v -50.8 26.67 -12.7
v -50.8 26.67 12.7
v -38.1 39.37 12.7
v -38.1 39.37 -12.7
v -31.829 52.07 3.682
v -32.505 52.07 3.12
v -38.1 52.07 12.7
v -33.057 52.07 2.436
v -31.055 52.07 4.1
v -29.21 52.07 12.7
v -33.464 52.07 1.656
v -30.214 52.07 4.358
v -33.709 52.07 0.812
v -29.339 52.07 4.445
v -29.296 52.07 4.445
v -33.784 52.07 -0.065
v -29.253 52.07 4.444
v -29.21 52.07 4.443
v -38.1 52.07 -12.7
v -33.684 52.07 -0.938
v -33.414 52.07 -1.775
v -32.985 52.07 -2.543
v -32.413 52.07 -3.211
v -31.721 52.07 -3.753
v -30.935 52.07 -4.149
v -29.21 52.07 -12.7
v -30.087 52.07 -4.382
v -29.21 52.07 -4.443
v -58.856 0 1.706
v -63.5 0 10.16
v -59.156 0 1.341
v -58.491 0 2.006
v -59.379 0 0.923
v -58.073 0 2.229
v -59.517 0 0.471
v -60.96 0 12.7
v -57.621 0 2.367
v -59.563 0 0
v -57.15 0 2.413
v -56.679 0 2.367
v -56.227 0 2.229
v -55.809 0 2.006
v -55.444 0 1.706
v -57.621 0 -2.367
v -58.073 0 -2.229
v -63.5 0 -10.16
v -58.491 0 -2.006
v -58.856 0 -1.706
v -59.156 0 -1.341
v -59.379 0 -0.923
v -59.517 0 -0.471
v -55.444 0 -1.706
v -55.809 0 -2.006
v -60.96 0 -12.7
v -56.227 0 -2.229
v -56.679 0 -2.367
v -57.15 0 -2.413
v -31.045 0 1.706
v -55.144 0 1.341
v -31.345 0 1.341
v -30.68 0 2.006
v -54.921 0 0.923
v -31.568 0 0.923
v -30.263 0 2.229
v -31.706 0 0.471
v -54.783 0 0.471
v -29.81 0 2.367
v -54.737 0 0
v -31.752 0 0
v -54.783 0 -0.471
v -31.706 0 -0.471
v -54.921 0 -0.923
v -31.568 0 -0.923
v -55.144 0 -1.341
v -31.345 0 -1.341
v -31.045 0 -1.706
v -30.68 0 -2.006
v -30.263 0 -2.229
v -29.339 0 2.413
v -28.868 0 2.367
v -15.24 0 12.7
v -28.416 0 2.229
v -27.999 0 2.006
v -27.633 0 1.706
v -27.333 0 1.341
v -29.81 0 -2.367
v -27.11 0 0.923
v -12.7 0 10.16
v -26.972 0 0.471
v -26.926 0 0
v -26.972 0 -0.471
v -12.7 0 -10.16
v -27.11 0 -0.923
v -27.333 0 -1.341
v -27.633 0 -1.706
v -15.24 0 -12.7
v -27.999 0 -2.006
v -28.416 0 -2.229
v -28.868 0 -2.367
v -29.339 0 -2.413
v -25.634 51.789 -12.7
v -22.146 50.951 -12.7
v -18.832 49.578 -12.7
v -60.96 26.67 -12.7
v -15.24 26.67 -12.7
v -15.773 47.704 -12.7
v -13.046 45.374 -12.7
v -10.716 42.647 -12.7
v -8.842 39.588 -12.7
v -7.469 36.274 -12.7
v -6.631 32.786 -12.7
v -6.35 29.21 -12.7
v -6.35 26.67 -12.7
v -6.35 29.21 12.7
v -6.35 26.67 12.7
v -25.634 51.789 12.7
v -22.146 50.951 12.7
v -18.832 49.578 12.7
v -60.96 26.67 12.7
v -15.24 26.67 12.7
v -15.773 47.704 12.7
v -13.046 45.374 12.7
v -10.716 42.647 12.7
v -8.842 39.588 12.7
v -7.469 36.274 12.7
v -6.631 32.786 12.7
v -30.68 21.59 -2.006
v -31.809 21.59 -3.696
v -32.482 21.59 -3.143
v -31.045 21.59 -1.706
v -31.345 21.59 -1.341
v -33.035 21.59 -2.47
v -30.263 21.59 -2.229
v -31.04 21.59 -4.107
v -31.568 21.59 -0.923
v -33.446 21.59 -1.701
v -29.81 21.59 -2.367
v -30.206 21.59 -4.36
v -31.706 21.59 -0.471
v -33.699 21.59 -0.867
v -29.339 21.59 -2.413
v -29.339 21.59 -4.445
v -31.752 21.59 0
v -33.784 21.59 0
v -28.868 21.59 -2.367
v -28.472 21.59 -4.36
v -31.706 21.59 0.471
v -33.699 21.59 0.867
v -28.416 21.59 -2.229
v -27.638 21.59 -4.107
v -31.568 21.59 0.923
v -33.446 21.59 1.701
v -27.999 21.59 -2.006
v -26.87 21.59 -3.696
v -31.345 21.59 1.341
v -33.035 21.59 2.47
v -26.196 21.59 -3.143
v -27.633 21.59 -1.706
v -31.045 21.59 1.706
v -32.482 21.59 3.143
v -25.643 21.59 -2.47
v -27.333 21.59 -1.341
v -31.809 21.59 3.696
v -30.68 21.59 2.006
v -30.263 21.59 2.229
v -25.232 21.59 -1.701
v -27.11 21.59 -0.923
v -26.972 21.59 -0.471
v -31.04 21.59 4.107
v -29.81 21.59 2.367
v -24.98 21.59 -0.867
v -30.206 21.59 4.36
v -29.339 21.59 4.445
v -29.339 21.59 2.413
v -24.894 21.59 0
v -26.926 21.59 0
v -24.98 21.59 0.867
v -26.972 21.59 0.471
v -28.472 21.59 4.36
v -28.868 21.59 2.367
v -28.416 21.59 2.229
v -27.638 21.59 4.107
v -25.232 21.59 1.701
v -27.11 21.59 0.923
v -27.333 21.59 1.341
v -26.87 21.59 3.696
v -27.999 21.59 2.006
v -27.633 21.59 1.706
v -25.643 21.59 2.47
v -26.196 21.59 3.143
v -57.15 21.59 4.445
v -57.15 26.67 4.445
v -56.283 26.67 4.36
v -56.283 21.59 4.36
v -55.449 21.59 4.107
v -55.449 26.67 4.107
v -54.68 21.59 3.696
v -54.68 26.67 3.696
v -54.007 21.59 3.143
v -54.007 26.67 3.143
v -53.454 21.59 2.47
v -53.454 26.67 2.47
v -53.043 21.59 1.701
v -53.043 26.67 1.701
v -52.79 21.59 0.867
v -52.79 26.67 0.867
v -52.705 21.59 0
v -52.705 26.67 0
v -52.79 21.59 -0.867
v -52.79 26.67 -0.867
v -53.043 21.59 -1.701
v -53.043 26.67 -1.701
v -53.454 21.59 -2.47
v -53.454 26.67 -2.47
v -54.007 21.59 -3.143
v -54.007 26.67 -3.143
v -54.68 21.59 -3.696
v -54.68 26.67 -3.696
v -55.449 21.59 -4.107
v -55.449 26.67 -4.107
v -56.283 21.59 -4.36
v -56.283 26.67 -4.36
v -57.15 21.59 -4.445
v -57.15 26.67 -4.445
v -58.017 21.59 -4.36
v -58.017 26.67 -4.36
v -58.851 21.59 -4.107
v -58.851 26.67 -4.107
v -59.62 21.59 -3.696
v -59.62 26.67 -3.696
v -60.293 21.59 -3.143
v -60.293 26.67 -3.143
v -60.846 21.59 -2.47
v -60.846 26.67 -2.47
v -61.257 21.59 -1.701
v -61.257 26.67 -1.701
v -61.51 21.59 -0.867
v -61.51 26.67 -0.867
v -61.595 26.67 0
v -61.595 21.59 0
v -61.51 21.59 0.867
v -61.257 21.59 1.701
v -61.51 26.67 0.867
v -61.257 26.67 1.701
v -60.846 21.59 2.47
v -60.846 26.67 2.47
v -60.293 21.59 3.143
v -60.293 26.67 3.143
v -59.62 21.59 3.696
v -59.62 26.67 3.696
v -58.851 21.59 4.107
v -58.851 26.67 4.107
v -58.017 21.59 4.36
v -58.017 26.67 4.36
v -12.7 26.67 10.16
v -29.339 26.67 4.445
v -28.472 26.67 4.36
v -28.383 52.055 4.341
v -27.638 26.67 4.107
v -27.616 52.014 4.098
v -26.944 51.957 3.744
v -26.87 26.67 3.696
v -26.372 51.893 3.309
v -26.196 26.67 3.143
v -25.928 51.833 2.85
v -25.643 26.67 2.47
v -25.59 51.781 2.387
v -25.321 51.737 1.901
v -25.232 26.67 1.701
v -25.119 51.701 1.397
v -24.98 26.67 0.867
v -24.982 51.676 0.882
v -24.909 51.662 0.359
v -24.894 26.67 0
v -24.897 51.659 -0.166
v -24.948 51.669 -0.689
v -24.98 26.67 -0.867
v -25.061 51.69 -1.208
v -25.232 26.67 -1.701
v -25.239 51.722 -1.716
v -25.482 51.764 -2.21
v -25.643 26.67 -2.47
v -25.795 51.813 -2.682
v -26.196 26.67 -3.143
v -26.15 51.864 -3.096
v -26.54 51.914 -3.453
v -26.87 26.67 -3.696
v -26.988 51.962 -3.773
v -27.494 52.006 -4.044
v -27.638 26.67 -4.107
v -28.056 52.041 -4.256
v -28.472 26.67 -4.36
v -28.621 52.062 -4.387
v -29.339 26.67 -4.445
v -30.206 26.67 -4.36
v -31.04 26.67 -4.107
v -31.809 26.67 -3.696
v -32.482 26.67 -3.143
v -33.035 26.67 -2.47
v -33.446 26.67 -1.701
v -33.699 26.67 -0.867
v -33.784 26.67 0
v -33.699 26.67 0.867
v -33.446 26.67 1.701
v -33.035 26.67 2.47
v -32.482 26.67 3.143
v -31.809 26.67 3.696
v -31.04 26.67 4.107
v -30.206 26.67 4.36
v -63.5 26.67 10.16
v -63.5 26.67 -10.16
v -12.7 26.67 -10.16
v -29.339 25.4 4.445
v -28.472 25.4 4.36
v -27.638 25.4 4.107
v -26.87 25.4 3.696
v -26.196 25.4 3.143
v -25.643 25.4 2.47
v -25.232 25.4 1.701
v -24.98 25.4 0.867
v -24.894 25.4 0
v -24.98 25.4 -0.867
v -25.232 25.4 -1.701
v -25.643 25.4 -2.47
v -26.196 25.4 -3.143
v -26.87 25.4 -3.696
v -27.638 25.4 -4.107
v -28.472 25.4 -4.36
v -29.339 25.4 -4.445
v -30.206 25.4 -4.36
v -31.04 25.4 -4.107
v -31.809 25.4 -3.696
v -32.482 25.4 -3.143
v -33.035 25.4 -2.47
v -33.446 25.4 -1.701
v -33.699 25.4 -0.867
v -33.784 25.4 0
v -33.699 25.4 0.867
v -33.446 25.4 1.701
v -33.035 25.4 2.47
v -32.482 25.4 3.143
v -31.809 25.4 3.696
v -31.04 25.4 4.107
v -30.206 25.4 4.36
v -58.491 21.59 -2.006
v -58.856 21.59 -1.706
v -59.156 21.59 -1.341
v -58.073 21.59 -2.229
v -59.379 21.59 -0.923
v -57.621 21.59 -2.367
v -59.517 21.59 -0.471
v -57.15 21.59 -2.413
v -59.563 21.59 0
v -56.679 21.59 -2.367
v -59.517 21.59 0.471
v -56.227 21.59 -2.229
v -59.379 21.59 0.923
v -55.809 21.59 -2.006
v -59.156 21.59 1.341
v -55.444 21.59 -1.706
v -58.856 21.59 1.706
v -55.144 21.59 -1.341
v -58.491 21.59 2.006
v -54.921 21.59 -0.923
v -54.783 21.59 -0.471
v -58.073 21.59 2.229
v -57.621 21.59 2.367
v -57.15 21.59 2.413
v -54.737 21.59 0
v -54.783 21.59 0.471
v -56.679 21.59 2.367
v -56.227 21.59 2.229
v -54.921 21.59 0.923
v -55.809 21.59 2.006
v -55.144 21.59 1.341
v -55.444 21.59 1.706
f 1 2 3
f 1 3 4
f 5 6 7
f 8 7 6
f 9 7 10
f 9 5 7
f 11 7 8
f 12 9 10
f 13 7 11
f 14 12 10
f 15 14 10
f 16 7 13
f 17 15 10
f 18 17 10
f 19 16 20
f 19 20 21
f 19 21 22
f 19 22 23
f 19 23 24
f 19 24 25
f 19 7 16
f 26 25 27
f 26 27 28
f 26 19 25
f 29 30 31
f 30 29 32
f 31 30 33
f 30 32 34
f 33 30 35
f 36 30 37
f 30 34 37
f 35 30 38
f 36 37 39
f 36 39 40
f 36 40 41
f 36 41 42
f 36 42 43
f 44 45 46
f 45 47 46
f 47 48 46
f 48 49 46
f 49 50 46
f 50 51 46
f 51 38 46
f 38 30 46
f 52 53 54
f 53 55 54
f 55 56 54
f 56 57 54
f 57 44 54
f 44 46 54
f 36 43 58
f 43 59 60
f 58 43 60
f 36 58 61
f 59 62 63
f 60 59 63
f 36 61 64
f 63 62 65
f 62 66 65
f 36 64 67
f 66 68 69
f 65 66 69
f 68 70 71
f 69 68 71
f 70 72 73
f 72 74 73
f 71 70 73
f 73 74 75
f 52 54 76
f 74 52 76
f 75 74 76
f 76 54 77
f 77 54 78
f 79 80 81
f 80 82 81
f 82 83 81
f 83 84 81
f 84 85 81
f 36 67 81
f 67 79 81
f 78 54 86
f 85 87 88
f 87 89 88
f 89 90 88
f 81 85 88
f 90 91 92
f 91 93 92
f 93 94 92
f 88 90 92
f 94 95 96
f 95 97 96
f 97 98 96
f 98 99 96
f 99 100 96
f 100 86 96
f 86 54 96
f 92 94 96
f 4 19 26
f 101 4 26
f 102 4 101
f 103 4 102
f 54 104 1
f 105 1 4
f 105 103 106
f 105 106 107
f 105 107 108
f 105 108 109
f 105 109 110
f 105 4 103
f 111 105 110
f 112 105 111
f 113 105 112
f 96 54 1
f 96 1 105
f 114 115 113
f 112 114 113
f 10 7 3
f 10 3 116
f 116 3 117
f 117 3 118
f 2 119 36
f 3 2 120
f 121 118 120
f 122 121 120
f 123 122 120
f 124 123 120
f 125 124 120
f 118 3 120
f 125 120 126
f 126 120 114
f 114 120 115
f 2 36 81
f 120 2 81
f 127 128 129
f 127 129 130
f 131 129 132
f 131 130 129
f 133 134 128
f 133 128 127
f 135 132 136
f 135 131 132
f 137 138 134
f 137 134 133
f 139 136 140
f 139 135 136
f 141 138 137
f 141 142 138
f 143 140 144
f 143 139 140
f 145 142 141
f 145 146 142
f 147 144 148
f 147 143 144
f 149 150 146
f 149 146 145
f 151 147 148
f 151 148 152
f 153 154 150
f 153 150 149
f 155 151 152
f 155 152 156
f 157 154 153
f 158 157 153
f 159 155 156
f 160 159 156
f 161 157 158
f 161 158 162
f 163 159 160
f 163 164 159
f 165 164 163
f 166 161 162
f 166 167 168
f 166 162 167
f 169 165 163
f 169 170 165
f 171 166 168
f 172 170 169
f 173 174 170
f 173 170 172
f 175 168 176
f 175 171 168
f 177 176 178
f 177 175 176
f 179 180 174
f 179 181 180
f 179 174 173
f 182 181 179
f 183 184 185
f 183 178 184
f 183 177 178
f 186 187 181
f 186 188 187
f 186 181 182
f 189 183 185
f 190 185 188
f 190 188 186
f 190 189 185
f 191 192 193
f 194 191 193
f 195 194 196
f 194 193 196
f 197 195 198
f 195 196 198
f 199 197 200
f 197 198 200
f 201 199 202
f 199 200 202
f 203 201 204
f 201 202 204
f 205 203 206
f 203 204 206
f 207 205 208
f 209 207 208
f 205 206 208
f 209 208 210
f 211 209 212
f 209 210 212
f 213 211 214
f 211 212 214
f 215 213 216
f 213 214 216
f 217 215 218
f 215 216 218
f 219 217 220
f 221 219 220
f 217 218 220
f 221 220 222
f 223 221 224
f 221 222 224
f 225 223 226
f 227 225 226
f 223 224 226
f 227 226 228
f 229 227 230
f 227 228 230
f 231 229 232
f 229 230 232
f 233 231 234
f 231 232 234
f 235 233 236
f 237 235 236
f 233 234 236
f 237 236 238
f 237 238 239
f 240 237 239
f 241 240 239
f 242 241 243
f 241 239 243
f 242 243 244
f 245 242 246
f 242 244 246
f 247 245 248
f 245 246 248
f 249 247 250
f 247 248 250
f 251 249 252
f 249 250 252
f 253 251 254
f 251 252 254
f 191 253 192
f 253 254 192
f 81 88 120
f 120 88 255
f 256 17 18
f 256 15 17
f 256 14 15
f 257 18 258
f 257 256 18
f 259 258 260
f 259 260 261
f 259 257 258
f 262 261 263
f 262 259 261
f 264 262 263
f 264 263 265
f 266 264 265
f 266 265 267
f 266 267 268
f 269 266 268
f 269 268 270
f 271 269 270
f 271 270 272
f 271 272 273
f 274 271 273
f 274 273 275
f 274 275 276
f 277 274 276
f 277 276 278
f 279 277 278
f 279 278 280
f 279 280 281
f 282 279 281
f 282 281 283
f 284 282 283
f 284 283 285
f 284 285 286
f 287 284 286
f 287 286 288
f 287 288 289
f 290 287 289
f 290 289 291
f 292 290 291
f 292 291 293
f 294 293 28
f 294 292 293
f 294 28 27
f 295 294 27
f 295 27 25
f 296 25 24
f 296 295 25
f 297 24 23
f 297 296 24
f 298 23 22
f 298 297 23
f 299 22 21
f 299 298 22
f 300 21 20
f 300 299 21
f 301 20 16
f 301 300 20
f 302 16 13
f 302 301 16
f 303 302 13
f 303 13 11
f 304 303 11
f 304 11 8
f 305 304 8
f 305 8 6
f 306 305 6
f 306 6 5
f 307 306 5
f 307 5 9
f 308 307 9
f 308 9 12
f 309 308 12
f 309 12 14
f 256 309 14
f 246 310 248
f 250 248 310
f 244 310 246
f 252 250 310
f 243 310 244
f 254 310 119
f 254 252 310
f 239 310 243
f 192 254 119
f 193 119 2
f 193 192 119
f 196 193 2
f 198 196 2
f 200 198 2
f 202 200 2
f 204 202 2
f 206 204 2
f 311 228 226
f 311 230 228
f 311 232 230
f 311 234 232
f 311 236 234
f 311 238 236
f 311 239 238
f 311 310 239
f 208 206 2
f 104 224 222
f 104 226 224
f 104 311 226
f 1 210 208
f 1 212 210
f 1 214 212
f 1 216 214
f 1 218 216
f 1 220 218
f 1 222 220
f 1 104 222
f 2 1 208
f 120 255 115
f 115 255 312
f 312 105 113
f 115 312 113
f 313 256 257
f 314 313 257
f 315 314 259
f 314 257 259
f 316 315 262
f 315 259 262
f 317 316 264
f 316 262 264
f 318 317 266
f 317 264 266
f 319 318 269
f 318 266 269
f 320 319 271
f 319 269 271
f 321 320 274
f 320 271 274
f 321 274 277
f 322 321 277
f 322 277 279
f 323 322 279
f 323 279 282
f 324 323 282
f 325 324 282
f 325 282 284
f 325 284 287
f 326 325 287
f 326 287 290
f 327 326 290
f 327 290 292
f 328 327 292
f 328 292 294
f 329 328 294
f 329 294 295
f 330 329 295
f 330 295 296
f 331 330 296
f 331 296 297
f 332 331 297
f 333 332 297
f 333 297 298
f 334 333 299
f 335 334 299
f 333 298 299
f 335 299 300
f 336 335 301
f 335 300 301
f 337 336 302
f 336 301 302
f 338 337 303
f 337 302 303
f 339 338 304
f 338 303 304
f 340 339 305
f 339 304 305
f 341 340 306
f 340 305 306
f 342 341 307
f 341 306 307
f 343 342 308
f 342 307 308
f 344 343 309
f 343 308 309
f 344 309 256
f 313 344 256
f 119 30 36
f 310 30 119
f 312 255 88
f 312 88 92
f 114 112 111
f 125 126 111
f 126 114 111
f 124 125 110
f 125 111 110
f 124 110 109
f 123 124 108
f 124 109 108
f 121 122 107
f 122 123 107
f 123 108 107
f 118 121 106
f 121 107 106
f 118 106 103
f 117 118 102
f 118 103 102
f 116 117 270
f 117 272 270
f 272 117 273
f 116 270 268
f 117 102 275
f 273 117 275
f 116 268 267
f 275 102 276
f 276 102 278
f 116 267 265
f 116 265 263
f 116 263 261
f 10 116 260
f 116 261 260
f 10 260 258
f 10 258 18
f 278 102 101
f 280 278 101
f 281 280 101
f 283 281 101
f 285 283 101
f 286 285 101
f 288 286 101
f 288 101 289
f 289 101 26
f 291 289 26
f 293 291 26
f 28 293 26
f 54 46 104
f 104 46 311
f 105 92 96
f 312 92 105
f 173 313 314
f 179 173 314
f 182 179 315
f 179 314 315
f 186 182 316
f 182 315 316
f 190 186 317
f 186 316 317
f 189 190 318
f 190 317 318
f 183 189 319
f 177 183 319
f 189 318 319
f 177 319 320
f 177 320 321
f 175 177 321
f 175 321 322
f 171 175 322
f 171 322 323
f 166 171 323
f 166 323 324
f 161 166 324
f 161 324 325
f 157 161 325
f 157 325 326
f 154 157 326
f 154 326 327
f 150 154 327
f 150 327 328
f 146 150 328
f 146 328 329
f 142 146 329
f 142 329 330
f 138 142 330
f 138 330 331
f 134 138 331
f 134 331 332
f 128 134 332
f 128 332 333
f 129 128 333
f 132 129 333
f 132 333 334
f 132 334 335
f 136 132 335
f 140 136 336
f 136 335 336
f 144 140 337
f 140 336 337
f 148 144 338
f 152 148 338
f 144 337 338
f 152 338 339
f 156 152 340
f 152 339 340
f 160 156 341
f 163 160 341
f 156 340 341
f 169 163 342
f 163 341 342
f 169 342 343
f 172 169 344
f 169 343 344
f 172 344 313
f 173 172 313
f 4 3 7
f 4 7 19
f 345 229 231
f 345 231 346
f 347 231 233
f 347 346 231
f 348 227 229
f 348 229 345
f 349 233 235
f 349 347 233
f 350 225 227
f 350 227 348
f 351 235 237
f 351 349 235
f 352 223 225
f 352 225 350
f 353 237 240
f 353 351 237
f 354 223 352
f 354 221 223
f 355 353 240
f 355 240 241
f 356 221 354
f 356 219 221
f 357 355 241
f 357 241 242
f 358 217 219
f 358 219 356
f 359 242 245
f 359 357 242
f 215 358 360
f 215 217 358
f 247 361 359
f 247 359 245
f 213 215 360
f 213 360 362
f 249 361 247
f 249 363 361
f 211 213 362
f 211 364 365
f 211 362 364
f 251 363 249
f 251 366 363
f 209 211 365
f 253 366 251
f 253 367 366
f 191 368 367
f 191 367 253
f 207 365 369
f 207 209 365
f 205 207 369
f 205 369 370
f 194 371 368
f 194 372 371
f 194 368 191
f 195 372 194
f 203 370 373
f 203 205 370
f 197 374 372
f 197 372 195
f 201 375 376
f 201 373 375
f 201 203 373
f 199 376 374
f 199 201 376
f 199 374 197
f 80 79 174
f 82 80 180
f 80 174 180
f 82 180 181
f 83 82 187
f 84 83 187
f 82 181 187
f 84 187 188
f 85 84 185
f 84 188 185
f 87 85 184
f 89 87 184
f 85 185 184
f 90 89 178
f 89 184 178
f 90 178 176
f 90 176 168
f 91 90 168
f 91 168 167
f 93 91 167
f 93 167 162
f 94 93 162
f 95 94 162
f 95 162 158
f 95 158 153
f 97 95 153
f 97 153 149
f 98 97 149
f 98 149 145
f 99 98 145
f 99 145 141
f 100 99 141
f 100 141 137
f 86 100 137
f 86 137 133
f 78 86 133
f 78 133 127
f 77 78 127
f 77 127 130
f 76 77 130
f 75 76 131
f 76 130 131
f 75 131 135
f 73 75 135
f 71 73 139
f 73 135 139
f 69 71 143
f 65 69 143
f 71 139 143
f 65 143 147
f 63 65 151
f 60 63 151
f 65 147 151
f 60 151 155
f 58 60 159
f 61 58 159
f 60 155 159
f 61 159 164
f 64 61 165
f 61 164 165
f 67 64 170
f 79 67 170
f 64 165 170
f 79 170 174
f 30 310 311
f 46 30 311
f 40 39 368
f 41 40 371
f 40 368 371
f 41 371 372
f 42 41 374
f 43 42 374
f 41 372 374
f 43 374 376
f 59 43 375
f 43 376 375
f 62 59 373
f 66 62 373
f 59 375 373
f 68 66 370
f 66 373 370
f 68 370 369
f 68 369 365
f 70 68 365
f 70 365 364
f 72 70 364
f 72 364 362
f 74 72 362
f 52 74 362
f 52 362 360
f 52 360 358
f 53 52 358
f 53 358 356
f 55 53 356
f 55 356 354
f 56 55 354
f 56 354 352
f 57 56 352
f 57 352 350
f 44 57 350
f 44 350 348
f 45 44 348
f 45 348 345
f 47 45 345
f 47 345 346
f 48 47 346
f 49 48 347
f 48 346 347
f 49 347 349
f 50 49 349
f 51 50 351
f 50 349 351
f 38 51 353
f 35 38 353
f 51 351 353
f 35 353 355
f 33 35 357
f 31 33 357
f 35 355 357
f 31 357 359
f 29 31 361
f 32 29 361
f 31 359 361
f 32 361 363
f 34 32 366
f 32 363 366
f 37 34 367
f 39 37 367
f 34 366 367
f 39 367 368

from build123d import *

# Parameters (mm, degrees)
SKETCH1_W               = 50.8
SKETCH1_H               = 25.4
BOSS_EXTRUDE1_DEPTH     = 26.67
SKETCH2_W               = 6.35
SKETCH2_H               = 25.4
BOSS_EXTRUDE2_DEPTH     = 25.4
SKETCH3_W               = 25.4
SKETCH3_H               = 25.4
BOSS_EXTRUDE3_DEPTH     = 25.4
CHAMFER1_SIZE           = 12.7
SKETCH4_R               = 2.413
CUT_EXTRUDE1_DEPTH      = 71.034483649
SKETCH4_4_R             = 4.445
SKETCH4_4_R_2           = 2.413
CUT_EXTRUDE2_DEPTH      = 5.08
CUT_EXTRUDE3_DEPTH      = 29.972
CUT_EXTRUDE3_DEPTH_BACK = 1.27
CUT_EXTRUDE3_START      = -25.4
SKETCH5_R               = 4.445
CHAMFER3_SIZE           = 2.54
FILLET1_R               = 22.86


with BuildPart() as part:
    # Sketch1 → Boss-Extrude1 (new body)
    with BuildSketch(Plane(origin=(0, 0, 0), x_dir=(1, 0, 0), z_dir=(0, 1, 0))):
        with Locations((-38.1, 0)):
            Rectangle(SKETCH1_W, SKETCH1_H)
    extrude(amount=BOSS_EXTRUDE1_DEPTH)



with BuildPart() as body_2:
    # Sketch2 → Boss-Extrude2 (new body)
    with BuildSketch(Plane(origin=(0, 26.67, 0), x_dir=(1, 0, 0), z_dir=(0, 1, 0))):
        with Locations((-9.525, 0)):
            Rectangle(SKETCH2_W, SKETCH2_H)
    extrude(amount=BOSS_EXTRUDE2_DEPTH)


with BuildPart() as part_1:
    add(part.part)

    add(body_2.part)  # Boss-Extrude3 merges body 2
    # Sketch3 → Boss-Extrude3 (add)
    with BuildSketch(Plane(origin=(0, 26.67, 0), x_dir=(1, 0, 0), z_dir=(0, 1, 0))):
        with Locations((-25.4, 0)):
            Rectangle(SKETCH3_W, SKETCH3_H)
    extrude(amount=BOSS_EXTRUDE3_DEPTH)

    # Chamfer1
    chamfer1_edges = [part_1.edges().sort_by_distance(p)[0] for p in [
        (-38.1, 26.67, 0),
    ]]
    chamfer(chamfer1_edges, length=CHAMFER1_SIZE)

    # Sketch4 → Cut-Extrude1 (cut, through all)
    with BuildSketch(Plane(origin=(0, 26.67, 0), x_dir=(1, 0, 0), z_dir=(0, 1, 0))):
        with Locations(Location((-57.15, 0, 0), (0, 0, 270))):
            Circle(SKETCH4_R)
        with Locations(Location((-29.339108581, 0, 0), (0, 0, 270))):
            Circle(SKETCH4_R)
    extrude(amount=-CUT_EXTRUDE1_DEPTH, mode=Mode.SUBTRACT)

    # Sketch4<4> → Cut-Extrude2 (cut)
    # profile 1 of 2: a face of its own
    with BuildSketch(Plane(origin=(0, 26.67, 0), x_dir=(1, 0, 0), z_dir=(0, 1, 0))):
        with Locations(Location((-57.15, 0, 0), (0, 0, 270))):
            Circle(SKETCH4_4_R)
        with Locations(Location((-57.15, 0, 0), (0, 0, 270))):
            Circle(SKETCH4_4_R_2, mode=Mode.SUBTRACT)
    # profile 2 of 2: a face of its own
    with BuildSketch(Plane(origin=(0, 26.67, 0), x_dir=(1, 0, 0), z_dir=(0, 1, 0))):
        with Locations(Location((-29.339108581, 0, 0), (0, 0, 270))):
            Circle(SKETCH4_4_R)
        with Locations(Location((-29.339108581, 0, 0), (0, 0, 270))):
            Circle(SKETCH4_4_R_2, mode=Mode.SUBTRACT)
    extrude(amount=-CUT_EXTRUDE2_DEPTH, mode=Mode.SUBTRACT)

    # Sketch5 → Cut-Extrude3 (cut, two sides: drawn at the far end of the back side and taken through both)
    with BuildSketch(Plane(origin=(0, 52.07, 0), x_dir=(1, 0, 0), z_dir=(0, 1, 0)).offset(CUT_EXTRUDE3_START - CUT_EXTRUDE3_DEPTH_BACK)):
        with Locations(Location((-29.339108581, 0, 0), (0, 0, 270))):
            Circle(SKETCH5_R)
    extrude(amount=CUT_EXTRUDE3_DEPTH + CUT_EXTRUDE3_DEPTH_BACK, mode=Mode.SUBTRACT)

    # Chamfer3
    chamfer3_edges = [part_1.edges().sort_by_distance(p)[0] for p in [
        (-12.7, 13.335, -12.7),
        (-12.7, 13.335, 12.7),
        (-63.5, 13.335, -12.7),
        (-63.5, 13.335, 12.7),
    ]]
    chamfer(chamfer3_edges, length=CHAMFER3_SIZE)

    # Fillet1
    # the kernel refuses this fillet: 22.86 mm, written as the material it takes off along each edge
    with BuildSketch(Plane(origin=(-6.35, 52.07, -69.85), x_dir=(-1, 0, 0), z_dir=(0, 0, 1))) as fillet1_piece_1:
        with BuildLine():
            CenterArc((FILLET1_R, FILLET1_R), FILLET1_R, 180, 90)
            Line((0, FILLET1_R), (0, 0))
            Line((0, 0), (FILLET1_R, 0))
        make_face()
    extrude(amount=139.7, mode=Mode.SUBTRACT)


solid = part_1.part
